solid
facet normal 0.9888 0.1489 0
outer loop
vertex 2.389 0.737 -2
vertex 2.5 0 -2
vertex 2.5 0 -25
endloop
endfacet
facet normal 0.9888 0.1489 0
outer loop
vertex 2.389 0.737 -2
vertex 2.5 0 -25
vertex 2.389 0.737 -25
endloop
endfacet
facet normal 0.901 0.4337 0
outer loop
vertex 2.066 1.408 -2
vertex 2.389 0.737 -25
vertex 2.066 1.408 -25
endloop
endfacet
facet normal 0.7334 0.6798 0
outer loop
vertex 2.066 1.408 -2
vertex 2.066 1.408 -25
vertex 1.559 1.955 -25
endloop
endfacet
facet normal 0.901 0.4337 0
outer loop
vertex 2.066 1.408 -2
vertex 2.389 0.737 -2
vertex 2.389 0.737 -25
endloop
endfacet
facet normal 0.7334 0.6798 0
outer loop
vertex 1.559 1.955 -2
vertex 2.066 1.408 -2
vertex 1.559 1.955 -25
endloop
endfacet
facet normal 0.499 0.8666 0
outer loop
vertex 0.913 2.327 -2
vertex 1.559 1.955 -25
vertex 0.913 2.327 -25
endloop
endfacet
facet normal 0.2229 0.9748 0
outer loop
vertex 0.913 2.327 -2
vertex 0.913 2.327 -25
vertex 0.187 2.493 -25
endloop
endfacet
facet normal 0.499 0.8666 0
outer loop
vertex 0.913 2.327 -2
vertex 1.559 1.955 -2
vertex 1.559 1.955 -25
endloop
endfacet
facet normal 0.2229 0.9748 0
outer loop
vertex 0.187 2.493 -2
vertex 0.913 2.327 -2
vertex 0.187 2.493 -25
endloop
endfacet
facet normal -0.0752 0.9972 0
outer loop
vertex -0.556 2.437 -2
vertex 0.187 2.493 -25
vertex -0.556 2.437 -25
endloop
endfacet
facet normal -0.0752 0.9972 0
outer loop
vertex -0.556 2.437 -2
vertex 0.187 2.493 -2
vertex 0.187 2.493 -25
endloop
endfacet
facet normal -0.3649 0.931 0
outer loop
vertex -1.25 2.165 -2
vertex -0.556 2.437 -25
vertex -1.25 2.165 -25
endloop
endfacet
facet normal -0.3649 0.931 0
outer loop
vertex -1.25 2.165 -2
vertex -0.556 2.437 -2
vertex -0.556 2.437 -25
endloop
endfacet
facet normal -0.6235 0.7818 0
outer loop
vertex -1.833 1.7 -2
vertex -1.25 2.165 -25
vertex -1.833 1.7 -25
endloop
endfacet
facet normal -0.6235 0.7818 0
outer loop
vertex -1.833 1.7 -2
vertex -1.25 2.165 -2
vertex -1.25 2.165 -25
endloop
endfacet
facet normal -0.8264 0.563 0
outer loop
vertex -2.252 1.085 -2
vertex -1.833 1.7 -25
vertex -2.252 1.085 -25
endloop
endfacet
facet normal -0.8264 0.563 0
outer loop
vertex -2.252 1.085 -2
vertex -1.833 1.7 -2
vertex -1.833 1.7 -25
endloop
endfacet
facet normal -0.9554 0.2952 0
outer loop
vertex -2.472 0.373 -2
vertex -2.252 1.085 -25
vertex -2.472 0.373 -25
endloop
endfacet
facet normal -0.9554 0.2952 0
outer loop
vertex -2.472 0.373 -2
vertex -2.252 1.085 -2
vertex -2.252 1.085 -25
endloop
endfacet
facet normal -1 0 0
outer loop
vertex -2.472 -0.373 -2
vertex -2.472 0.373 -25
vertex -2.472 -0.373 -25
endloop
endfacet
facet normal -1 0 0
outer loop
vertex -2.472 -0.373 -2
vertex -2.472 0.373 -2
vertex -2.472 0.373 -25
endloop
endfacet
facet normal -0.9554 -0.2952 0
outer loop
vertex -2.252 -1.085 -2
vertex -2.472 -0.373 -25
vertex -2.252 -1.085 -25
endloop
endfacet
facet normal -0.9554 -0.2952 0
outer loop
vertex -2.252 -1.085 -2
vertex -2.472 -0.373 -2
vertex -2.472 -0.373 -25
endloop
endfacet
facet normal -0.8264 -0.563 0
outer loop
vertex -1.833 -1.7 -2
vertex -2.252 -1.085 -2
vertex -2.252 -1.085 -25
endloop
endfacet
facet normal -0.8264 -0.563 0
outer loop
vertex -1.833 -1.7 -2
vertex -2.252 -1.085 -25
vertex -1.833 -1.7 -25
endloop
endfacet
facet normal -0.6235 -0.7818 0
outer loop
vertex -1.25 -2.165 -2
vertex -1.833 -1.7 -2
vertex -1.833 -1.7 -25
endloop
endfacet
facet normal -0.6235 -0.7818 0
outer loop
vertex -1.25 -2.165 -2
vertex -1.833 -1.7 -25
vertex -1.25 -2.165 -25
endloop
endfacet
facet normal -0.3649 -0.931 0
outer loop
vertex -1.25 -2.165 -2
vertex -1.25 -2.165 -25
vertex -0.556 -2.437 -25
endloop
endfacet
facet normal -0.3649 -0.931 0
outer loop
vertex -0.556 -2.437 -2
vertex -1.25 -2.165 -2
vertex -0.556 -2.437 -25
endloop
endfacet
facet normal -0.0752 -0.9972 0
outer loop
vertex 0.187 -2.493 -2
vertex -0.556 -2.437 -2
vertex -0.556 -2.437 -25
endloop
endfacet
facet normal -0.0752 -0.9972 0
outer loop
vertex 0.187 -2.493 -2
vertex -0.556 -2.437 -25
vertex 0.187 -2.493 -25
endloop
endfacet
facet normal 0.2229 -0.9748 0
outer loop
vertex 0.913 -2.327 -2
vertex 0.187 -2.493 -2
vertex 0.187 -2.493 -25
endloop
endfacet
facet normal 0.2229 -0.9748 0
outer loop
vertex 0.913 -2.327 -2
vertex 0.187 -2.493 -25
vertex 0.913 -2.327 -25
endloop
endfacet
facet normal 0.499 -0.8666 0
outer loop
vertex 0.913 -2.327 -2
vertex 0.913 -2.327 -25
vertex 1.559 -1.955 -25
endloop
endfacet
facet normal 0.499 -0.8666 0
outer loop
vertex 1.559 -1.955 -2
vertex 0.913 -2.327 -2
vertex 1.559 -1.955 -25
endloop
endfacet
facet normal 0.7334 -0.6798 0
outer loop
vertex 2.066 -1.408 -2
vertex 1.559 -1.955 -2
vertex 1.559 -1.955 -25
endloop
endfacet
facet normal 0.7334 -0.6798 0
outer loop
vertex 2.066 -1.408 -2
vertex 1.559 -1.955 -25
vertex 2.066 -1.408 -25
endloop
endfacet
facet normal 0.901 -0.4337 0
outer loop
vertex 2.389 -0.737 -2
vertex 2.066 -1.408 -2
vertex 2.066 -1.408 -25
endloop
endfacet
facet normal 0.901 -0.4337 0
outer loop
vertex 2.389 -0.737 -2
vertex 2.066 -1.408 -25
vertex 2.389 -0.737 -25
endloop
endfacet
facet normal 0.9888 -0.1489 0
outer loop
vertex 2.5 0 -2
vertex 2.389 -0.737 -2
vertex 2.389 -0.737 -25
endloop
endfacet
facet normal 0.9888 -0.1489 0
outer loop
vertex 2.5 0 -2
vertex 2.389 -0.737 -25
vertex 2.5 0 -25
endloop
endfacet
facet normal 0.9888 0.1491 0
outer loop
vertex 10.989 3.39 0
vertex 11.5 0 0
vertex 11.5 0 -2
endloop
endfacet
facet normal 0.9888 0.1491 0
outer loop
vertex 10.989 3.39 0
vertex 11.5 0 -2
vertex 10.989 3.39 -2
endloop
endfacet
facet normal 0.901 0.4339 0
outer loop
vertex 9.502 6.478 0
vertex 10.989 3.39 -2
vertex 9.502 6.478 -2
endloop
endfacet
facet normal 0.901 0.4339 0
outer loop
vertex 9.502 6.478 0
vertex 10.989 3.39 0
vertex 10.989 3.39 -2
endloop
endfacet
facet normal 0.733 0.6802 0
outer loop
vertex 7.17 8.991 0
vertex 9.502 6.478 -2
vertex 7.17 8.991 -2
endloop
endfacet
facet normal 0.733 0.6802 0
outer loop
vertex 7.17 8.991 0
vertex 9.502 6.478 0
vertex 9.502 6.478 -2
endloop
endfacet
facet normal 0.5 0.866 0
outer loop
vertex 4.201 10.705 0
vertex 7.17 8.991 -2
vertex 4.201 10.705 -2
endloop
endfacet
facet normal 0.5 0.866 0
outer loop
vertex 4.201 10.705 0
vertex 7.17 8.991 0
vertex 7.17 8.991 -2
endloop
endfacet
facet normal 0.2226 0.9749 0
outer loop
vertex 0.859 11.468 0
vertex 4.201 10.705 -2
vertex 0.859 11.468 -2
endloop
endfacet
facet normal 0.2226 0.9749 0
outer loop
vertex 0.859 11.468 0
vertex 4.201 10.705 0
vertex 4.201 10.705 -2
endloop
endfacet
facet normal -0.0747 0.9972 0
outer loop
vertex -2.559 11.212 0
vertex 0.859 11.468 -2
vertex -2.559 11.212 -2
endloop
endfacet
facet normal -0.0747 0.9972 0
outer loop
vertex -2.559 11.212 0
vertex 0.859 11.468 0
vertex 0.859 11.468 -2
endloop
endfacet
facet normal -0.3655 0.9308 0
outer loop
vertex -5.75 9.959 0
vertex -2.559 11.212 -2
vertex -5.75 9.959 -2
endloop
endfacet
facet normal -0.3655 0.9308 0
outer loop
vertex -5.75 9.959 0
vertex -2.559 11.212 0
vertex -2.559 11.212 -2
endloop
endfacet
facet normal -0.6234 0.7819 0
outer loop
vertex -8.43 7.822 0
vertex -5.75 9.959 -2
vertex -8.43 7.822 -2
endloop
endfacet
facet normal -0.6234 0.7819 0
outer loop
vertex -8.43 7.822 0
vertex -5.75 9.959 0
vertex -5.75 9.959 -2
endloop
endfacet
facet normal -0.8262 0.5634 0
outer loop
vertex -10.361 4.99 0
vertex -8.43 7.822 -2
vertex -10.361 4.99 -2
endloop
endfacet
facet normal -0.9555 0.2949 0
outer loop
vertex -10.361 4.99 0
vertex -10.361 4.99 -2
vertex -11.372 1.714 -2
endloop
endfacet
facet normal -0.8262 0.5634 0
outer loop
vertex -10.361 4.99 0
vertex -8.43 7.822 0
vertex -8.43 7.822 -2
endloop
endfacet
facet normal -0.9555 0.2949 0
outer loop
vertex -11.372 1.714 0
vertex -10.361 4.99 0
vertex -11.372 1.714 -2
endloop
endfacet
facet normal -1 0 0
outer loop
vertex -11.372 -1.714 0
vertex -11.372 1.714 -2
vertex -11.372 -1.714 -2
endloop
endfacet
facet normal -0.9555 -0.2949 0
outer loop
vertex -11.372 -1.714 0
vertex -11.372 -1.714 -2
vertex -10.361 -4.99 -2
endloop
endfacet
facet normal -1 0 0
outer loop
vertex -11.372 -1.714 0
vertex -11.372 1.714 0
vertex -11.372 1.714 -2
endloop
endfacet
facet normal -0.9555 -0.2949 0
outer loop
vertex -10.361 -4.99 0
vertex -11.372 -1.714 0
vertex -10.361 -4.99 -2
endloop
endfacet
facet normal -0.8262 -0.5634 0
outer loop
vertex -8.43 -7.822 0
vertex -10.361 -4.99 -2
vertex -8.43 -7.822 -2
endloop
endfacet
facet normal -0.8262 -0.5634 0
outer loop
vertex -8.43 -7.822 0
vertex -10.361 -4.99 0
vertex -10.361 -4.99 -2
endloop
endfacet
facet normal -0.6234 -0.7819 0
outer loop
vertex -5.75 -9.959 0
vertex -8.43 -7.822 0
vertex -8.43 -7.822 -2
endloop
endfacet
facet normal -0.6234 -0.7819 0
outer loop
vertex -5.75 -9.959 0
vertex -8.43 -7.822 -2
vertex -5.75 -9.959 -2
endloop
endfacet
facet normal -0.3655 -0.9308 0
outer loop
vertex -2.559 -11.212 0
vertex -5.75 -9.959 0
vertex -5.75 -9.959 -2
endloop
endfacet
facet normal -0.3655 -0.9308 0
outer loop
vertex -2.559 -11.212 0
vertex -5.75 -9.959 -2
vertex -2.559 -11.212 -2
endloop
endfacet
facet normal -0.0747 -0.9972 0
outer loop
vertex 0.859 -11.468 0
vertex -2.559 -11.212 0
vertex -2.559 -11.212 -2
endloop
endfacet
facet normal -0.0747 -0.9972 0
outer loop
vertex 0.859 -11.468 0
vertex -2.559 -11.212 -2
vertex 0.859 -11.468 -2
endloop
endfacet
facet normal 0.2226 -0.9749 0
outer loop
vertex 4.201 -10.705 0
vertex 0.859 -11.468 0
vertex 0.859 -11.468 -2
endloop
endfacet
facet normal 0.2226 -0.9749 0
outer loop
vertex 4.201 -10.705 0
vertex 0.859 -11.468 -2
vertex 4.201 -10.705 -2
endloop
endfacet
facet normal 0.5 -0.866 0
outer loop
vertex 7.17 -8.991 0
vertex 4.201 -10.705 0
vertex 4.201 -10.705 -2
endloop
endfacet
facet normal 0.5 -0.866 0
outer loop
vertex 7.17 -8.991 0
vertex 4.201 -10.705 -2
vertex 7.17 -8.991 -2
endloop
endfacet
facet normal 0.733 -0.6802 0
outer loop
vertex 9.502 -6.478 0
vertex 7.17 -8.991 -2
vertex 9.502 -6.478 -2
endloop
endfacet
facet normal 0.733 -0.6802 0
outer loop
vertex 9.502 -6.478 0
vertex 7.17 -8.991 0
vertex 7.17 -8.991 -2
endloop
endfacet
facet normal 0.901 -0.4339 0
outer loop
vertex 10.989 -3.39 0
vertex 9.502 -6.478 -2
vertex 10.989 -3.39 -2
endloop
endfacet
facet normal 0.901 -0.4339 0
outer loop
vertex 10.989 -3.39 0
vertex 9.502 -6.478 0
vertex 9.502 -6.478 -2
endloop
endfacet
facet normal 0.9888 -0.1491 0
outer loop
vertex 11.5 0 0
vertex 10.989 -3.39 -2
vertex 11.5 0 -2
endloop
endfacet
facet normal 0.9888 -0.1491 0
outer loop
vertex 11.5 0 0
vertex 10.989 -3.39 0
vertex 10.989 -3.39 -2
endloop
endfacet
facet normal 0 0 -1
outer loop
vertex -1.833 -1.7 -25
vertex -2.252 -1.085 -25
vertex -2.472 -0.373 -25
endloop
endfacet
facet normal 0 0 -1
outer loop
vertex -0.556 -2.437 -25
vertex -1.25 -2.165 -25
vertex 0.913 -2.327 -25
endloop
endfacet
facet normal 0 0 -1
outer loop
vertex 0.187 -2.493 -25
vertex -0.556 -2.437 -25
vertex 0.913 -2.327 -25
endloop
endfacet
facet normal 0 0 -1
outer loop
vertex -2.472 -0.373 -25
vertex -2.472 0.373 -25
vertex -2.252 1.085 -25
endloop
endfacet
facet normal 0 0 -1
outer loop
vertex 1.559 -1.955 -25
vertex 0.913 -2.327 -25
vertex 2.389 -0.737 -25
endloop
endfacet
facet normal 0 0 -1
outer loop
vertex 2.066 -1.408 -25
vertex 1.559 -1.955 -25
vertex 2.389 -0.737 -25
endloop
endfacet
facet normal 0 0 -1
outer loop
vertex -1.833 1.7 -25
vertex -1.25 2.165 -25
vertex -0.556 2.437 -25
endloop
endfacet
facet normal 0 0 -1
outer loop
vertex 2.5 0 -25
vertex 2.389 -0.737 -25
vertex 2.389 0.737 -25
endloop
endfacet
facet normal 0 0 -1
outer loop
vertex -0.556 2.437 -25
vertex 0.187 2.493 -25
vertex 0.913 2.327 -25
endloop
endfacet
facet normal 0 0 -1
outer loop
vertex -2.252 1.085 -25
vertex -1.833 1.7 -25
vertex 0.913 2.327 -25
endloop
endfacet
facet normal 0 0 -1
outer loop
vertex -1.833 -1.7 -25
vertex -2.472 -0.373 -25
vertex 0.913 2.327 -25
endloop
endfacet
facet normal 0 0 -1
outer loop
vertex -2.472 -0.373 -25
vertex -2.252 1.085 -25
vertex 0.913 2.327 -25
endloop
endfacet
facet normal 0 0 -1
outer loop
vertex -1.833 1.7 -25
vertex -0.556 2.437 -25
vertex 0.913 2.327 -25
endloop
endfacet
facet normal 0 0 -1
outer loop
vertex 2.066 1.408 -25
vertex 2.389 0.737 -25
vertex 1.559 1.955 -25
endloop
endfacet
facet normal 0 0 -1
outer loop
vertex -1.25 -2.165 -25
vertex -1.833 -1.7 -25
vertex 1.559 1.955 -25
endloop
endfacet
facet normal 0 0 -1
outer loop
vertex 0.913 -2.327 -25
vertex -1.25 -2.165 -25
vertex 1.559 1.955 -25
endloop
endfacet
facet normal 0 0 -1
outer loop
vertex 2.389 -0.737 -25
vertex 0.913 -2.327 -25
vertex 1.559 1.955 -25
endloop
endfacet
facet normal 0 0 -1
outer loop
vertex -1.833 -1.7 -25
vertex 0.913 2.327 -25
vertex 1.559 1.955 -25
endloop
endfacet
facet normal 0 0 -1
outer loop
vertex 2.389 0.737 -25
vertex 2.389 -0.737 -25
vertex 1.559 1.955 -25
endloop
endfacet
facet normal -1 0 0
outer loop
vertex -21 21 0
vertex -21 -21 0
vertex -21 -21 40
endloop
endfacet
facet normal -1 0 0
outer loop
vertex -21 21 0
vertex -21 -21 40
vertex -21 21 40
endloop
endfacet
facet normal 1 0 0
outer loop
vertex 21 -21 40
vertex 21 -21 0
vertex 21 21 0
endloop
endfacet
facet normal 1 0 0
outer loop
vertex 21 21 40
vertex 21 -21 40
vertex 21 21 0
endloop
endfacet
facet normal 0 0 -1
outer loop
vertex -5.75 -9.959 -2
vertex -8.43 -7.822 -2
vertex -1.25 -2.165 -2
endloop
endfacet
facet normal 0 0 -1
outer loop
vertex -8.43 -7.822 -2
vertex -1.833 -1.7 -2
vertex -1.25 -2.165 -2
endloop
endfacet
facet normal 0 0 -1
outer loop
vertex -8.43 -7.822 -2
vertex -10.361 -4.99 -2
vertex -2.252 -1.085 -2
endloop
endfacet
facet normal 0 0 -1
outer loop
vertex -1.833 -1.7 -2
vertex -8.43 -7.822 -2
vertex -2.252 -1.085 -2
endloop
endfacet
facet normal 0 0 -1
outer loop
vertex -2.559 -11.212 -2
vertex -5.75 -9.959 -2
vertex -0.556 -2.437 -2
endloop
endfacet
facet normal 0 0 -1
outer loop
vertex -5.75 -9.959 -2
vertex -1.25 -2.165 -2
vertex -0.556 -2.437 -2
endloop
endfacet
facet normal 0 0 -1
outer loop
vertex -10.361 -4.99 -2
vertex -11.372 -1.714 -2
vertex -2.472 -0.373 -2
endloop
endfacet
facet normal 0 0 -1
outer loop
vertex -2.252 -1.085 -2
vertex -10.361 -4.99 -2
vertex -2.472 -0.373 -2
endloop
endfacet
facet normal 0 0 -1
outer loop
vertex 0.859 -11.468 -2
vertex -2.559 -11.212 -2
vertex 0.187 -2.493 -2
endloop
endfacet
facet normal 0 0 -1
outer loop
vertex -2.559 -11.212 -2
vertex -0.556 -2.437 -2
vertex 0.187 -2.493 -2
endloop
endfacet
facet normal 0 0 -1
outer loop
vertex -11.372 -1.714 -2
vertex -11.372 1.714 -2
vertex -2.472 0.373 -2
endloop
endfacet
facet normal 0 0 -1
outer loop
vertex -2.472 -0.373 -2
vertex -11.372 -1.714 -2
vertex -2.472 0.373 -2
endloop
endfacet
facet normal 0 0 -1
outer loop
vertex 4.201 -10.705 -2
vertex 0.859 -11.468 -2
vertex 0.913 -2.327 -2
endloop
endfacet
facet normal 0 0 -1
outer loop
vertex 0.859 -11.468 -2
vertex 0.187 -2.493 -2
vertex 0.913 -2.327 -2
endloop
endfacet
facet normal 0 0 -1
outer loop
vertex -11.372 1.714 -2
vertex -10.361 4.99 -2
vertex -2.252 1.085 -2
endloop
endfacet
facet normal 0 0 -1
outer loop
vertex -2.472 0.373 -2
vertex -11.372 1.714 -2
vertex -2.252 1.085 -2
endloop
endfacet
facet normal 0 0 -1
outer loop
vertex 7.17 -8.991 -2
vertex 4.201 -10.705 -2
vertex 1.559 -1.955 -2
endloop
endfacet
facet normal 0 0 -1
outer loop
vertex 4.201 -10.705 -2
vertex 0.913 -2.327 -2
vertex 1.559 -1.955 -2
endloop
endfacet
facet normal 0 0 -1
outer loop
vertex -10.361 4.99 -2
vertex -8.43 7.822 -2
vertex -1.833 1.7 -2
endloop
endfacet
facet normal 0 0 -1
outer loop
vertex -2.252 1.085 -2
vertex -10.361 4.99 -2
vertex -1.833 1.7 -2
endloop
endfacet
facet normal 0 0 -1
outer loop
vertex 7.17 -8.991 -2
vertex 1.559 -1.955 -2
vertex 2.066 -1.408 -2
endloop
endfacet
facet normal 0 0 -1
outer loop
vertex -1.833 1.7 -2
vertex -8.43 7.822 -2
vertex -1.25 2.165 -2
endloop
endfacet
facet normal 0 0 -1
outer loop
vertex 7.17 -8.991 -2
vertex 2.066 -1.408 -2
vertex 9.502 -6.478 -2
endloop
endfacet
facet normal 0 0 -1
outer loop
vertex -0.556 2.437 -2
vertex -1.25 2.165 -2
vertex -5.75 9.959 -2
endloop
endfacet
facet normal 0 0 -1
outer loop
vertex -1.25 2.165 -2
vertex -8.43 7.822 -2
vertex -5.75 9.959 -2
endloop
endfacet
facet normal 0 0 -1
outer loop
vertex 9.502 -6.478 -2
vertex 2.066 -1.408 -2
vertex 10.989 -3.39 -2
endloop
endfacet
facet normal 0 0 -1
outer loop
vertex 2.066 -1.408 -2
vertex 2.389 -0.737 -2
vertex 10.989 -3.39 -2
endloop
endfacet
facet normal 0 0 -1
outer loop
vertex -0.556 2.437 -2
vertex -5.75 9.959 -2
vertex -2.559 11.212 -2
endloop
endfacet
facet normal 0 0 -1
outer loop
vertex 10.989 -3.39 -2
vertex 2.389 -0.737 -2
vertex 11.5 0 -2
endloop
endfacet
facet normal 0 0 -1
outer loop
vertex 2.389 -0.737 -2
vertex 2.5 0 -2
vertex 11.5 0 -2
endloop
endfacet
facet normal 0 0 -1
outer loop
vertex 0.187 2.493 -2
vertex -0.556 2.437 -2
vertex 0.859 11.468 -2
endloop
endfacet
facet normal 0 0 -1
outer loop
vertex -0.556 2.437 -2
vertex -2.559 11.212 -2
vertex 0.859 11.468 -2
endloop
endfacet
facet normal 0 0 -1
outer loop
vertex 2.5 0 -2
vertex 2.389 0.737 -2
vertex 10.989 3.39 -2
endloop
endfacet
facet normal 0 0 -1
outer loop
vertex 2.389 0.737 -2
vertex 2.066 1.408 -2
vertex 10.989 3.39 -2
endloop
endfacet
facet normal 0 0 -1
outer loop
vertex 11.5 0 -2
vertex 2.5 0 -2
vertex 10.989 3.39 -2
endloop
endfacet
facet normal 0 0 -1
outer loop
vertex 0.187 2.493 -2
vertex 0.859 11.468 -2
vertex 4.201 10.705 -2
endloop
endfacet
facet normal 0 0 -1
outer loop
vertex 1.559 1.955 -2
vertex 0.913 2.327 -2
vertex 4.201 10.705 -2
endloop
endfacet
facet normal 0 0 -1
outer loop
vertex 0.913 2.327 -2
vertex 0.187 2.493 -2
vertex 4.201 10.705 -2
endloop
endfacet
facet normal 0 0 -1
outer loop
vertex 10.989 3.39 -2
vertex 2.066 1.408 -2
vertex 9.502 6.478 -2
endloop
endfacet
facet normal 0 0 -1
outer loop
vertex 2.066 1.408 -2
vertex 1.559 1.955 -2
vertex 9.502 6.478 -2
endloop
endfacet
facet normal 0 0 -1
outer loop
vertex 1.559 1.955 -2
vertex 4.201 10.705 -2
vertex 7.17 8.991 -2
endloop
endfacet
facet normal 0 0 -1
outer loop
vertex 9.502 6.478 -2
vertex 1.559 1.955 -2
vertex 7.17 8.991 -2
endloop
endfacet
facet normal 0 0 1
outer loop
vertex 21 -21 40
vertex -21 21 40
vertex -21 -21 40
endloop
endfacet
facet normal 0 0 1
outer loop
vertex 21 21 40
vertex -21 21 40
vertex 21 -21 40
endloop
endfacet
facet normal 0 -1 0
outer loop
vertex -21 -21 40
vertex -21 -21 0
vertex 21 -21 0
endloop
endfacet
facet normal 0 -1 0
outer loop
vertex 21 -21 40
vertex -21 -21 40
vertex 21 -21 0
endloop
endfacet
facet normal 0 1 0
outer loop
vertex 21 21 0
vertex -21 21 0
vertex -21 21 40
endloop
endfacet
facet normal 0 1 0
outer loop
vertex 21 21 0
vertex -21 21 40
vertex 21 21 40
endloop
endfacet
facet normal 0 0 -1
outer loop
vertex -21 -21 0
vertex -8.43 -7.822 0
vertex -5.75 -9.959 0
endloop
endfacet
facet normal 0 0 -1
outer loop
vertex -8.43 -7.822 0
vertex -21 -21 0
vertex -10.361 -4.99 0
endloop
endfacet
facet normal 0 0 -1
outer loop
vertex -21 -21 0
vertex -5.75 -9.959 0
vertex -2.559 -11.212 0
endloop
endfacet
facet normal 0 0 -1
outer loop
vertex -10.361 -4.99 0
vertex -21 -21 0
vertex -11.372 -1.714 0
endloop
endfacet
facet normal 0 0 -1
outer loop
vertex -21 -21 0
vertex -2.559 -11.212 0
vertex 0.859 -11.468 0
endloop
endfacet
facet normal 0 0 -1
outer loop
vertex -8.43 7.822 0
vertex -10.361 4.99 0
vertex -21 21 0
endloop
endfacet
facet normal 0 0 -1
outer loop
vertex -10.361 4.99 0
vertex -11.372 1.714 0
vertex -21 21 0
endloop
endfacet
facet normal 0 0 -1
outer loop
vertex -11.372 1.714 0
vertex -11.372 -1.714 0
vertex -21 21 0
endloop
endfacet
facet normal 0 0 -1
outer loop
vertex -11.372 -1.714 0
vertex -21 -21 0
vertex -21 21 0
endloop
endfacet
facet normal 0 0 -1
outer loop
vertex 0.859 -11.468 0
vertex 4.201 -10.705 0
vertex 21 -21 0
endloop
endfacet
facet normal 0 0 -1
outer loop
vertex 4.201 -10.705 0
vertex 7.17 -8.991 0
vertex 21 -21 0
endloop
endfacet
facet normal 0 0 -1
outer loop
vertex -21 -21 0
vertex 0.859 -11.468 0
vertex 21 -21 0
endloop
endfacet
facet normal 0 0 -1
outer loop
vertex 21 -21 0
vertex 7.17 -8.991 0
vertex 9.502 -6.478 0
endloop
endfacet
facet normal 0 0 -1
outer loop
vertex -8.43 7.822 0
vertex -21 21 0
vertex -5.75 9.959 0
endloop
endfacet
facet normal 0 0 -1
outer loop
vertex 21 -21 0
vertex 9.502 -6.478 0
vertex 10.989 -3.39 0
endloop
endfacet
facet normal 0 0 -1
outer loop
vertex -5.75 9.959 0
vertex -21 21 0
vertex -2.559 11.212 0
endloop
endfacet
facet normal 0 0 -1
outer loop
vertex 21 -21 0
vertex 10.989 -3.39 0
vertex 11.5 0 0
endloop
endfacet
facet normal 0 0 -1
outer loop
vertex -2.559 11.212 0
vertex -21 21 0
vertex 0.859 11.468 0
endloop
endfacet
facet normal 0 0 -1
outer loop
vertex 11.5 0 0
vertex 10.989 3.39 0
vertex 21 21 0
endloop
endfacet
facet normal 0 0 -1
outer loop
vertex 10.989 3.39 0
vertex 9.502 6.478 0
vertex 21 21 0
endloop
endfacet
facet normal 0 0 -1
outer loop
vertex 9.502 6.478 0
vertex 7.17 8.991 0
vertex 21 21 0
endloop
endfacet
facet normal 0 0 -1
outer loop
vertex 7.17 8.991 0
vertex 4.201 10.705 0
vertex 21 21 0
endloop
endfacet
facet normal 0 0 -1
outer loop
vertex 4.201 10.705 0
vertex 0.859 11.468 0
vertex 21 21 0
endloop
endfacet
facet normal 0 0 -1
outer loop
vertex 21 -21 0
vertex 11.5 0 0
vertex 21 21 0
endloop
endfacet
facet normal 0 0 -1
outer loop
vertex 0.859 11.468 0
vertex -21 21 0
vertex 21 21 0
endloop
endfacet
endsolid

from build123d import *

# Parameters (mm, degrees)
SKETCH_1_W      = 42
SKETCH_1_H      = 42
EXTRUDE_1_DEPTH = 40
SKETCH_1_3_R    = 11.5
EXTRUDE_2_DEPTH = 2
SKETCH_1_4_R    = 2.5
EXTRUDE_3_DEPTH = 25


with BuildPart() as part:
    # 草图1 → 凸台-拉伸1 (new body)
    with BuildSketch(Plane.XY):
        Rectangle(SKETCH_1_W, SKETCH_1_H)
    extrude(amount=EXTRUDE_1_DEPTH)

    # 草图1<3> → 凸台-拉伸2 (add)
    with BuildSketch(Plane.XY):
        Circle(SKETCH_1_3_R)
    extrude(amount=-EXTRUDE_2_DEPTH)

    # 草图1<4> → 凸台-拉伸3 (add)
    with BuildSketch(Plane.XY):
        Circle(SKETCH_1_4_R)
    extrude(amount=-EXTRUDE_3_DEPTH)


solid = part.part
